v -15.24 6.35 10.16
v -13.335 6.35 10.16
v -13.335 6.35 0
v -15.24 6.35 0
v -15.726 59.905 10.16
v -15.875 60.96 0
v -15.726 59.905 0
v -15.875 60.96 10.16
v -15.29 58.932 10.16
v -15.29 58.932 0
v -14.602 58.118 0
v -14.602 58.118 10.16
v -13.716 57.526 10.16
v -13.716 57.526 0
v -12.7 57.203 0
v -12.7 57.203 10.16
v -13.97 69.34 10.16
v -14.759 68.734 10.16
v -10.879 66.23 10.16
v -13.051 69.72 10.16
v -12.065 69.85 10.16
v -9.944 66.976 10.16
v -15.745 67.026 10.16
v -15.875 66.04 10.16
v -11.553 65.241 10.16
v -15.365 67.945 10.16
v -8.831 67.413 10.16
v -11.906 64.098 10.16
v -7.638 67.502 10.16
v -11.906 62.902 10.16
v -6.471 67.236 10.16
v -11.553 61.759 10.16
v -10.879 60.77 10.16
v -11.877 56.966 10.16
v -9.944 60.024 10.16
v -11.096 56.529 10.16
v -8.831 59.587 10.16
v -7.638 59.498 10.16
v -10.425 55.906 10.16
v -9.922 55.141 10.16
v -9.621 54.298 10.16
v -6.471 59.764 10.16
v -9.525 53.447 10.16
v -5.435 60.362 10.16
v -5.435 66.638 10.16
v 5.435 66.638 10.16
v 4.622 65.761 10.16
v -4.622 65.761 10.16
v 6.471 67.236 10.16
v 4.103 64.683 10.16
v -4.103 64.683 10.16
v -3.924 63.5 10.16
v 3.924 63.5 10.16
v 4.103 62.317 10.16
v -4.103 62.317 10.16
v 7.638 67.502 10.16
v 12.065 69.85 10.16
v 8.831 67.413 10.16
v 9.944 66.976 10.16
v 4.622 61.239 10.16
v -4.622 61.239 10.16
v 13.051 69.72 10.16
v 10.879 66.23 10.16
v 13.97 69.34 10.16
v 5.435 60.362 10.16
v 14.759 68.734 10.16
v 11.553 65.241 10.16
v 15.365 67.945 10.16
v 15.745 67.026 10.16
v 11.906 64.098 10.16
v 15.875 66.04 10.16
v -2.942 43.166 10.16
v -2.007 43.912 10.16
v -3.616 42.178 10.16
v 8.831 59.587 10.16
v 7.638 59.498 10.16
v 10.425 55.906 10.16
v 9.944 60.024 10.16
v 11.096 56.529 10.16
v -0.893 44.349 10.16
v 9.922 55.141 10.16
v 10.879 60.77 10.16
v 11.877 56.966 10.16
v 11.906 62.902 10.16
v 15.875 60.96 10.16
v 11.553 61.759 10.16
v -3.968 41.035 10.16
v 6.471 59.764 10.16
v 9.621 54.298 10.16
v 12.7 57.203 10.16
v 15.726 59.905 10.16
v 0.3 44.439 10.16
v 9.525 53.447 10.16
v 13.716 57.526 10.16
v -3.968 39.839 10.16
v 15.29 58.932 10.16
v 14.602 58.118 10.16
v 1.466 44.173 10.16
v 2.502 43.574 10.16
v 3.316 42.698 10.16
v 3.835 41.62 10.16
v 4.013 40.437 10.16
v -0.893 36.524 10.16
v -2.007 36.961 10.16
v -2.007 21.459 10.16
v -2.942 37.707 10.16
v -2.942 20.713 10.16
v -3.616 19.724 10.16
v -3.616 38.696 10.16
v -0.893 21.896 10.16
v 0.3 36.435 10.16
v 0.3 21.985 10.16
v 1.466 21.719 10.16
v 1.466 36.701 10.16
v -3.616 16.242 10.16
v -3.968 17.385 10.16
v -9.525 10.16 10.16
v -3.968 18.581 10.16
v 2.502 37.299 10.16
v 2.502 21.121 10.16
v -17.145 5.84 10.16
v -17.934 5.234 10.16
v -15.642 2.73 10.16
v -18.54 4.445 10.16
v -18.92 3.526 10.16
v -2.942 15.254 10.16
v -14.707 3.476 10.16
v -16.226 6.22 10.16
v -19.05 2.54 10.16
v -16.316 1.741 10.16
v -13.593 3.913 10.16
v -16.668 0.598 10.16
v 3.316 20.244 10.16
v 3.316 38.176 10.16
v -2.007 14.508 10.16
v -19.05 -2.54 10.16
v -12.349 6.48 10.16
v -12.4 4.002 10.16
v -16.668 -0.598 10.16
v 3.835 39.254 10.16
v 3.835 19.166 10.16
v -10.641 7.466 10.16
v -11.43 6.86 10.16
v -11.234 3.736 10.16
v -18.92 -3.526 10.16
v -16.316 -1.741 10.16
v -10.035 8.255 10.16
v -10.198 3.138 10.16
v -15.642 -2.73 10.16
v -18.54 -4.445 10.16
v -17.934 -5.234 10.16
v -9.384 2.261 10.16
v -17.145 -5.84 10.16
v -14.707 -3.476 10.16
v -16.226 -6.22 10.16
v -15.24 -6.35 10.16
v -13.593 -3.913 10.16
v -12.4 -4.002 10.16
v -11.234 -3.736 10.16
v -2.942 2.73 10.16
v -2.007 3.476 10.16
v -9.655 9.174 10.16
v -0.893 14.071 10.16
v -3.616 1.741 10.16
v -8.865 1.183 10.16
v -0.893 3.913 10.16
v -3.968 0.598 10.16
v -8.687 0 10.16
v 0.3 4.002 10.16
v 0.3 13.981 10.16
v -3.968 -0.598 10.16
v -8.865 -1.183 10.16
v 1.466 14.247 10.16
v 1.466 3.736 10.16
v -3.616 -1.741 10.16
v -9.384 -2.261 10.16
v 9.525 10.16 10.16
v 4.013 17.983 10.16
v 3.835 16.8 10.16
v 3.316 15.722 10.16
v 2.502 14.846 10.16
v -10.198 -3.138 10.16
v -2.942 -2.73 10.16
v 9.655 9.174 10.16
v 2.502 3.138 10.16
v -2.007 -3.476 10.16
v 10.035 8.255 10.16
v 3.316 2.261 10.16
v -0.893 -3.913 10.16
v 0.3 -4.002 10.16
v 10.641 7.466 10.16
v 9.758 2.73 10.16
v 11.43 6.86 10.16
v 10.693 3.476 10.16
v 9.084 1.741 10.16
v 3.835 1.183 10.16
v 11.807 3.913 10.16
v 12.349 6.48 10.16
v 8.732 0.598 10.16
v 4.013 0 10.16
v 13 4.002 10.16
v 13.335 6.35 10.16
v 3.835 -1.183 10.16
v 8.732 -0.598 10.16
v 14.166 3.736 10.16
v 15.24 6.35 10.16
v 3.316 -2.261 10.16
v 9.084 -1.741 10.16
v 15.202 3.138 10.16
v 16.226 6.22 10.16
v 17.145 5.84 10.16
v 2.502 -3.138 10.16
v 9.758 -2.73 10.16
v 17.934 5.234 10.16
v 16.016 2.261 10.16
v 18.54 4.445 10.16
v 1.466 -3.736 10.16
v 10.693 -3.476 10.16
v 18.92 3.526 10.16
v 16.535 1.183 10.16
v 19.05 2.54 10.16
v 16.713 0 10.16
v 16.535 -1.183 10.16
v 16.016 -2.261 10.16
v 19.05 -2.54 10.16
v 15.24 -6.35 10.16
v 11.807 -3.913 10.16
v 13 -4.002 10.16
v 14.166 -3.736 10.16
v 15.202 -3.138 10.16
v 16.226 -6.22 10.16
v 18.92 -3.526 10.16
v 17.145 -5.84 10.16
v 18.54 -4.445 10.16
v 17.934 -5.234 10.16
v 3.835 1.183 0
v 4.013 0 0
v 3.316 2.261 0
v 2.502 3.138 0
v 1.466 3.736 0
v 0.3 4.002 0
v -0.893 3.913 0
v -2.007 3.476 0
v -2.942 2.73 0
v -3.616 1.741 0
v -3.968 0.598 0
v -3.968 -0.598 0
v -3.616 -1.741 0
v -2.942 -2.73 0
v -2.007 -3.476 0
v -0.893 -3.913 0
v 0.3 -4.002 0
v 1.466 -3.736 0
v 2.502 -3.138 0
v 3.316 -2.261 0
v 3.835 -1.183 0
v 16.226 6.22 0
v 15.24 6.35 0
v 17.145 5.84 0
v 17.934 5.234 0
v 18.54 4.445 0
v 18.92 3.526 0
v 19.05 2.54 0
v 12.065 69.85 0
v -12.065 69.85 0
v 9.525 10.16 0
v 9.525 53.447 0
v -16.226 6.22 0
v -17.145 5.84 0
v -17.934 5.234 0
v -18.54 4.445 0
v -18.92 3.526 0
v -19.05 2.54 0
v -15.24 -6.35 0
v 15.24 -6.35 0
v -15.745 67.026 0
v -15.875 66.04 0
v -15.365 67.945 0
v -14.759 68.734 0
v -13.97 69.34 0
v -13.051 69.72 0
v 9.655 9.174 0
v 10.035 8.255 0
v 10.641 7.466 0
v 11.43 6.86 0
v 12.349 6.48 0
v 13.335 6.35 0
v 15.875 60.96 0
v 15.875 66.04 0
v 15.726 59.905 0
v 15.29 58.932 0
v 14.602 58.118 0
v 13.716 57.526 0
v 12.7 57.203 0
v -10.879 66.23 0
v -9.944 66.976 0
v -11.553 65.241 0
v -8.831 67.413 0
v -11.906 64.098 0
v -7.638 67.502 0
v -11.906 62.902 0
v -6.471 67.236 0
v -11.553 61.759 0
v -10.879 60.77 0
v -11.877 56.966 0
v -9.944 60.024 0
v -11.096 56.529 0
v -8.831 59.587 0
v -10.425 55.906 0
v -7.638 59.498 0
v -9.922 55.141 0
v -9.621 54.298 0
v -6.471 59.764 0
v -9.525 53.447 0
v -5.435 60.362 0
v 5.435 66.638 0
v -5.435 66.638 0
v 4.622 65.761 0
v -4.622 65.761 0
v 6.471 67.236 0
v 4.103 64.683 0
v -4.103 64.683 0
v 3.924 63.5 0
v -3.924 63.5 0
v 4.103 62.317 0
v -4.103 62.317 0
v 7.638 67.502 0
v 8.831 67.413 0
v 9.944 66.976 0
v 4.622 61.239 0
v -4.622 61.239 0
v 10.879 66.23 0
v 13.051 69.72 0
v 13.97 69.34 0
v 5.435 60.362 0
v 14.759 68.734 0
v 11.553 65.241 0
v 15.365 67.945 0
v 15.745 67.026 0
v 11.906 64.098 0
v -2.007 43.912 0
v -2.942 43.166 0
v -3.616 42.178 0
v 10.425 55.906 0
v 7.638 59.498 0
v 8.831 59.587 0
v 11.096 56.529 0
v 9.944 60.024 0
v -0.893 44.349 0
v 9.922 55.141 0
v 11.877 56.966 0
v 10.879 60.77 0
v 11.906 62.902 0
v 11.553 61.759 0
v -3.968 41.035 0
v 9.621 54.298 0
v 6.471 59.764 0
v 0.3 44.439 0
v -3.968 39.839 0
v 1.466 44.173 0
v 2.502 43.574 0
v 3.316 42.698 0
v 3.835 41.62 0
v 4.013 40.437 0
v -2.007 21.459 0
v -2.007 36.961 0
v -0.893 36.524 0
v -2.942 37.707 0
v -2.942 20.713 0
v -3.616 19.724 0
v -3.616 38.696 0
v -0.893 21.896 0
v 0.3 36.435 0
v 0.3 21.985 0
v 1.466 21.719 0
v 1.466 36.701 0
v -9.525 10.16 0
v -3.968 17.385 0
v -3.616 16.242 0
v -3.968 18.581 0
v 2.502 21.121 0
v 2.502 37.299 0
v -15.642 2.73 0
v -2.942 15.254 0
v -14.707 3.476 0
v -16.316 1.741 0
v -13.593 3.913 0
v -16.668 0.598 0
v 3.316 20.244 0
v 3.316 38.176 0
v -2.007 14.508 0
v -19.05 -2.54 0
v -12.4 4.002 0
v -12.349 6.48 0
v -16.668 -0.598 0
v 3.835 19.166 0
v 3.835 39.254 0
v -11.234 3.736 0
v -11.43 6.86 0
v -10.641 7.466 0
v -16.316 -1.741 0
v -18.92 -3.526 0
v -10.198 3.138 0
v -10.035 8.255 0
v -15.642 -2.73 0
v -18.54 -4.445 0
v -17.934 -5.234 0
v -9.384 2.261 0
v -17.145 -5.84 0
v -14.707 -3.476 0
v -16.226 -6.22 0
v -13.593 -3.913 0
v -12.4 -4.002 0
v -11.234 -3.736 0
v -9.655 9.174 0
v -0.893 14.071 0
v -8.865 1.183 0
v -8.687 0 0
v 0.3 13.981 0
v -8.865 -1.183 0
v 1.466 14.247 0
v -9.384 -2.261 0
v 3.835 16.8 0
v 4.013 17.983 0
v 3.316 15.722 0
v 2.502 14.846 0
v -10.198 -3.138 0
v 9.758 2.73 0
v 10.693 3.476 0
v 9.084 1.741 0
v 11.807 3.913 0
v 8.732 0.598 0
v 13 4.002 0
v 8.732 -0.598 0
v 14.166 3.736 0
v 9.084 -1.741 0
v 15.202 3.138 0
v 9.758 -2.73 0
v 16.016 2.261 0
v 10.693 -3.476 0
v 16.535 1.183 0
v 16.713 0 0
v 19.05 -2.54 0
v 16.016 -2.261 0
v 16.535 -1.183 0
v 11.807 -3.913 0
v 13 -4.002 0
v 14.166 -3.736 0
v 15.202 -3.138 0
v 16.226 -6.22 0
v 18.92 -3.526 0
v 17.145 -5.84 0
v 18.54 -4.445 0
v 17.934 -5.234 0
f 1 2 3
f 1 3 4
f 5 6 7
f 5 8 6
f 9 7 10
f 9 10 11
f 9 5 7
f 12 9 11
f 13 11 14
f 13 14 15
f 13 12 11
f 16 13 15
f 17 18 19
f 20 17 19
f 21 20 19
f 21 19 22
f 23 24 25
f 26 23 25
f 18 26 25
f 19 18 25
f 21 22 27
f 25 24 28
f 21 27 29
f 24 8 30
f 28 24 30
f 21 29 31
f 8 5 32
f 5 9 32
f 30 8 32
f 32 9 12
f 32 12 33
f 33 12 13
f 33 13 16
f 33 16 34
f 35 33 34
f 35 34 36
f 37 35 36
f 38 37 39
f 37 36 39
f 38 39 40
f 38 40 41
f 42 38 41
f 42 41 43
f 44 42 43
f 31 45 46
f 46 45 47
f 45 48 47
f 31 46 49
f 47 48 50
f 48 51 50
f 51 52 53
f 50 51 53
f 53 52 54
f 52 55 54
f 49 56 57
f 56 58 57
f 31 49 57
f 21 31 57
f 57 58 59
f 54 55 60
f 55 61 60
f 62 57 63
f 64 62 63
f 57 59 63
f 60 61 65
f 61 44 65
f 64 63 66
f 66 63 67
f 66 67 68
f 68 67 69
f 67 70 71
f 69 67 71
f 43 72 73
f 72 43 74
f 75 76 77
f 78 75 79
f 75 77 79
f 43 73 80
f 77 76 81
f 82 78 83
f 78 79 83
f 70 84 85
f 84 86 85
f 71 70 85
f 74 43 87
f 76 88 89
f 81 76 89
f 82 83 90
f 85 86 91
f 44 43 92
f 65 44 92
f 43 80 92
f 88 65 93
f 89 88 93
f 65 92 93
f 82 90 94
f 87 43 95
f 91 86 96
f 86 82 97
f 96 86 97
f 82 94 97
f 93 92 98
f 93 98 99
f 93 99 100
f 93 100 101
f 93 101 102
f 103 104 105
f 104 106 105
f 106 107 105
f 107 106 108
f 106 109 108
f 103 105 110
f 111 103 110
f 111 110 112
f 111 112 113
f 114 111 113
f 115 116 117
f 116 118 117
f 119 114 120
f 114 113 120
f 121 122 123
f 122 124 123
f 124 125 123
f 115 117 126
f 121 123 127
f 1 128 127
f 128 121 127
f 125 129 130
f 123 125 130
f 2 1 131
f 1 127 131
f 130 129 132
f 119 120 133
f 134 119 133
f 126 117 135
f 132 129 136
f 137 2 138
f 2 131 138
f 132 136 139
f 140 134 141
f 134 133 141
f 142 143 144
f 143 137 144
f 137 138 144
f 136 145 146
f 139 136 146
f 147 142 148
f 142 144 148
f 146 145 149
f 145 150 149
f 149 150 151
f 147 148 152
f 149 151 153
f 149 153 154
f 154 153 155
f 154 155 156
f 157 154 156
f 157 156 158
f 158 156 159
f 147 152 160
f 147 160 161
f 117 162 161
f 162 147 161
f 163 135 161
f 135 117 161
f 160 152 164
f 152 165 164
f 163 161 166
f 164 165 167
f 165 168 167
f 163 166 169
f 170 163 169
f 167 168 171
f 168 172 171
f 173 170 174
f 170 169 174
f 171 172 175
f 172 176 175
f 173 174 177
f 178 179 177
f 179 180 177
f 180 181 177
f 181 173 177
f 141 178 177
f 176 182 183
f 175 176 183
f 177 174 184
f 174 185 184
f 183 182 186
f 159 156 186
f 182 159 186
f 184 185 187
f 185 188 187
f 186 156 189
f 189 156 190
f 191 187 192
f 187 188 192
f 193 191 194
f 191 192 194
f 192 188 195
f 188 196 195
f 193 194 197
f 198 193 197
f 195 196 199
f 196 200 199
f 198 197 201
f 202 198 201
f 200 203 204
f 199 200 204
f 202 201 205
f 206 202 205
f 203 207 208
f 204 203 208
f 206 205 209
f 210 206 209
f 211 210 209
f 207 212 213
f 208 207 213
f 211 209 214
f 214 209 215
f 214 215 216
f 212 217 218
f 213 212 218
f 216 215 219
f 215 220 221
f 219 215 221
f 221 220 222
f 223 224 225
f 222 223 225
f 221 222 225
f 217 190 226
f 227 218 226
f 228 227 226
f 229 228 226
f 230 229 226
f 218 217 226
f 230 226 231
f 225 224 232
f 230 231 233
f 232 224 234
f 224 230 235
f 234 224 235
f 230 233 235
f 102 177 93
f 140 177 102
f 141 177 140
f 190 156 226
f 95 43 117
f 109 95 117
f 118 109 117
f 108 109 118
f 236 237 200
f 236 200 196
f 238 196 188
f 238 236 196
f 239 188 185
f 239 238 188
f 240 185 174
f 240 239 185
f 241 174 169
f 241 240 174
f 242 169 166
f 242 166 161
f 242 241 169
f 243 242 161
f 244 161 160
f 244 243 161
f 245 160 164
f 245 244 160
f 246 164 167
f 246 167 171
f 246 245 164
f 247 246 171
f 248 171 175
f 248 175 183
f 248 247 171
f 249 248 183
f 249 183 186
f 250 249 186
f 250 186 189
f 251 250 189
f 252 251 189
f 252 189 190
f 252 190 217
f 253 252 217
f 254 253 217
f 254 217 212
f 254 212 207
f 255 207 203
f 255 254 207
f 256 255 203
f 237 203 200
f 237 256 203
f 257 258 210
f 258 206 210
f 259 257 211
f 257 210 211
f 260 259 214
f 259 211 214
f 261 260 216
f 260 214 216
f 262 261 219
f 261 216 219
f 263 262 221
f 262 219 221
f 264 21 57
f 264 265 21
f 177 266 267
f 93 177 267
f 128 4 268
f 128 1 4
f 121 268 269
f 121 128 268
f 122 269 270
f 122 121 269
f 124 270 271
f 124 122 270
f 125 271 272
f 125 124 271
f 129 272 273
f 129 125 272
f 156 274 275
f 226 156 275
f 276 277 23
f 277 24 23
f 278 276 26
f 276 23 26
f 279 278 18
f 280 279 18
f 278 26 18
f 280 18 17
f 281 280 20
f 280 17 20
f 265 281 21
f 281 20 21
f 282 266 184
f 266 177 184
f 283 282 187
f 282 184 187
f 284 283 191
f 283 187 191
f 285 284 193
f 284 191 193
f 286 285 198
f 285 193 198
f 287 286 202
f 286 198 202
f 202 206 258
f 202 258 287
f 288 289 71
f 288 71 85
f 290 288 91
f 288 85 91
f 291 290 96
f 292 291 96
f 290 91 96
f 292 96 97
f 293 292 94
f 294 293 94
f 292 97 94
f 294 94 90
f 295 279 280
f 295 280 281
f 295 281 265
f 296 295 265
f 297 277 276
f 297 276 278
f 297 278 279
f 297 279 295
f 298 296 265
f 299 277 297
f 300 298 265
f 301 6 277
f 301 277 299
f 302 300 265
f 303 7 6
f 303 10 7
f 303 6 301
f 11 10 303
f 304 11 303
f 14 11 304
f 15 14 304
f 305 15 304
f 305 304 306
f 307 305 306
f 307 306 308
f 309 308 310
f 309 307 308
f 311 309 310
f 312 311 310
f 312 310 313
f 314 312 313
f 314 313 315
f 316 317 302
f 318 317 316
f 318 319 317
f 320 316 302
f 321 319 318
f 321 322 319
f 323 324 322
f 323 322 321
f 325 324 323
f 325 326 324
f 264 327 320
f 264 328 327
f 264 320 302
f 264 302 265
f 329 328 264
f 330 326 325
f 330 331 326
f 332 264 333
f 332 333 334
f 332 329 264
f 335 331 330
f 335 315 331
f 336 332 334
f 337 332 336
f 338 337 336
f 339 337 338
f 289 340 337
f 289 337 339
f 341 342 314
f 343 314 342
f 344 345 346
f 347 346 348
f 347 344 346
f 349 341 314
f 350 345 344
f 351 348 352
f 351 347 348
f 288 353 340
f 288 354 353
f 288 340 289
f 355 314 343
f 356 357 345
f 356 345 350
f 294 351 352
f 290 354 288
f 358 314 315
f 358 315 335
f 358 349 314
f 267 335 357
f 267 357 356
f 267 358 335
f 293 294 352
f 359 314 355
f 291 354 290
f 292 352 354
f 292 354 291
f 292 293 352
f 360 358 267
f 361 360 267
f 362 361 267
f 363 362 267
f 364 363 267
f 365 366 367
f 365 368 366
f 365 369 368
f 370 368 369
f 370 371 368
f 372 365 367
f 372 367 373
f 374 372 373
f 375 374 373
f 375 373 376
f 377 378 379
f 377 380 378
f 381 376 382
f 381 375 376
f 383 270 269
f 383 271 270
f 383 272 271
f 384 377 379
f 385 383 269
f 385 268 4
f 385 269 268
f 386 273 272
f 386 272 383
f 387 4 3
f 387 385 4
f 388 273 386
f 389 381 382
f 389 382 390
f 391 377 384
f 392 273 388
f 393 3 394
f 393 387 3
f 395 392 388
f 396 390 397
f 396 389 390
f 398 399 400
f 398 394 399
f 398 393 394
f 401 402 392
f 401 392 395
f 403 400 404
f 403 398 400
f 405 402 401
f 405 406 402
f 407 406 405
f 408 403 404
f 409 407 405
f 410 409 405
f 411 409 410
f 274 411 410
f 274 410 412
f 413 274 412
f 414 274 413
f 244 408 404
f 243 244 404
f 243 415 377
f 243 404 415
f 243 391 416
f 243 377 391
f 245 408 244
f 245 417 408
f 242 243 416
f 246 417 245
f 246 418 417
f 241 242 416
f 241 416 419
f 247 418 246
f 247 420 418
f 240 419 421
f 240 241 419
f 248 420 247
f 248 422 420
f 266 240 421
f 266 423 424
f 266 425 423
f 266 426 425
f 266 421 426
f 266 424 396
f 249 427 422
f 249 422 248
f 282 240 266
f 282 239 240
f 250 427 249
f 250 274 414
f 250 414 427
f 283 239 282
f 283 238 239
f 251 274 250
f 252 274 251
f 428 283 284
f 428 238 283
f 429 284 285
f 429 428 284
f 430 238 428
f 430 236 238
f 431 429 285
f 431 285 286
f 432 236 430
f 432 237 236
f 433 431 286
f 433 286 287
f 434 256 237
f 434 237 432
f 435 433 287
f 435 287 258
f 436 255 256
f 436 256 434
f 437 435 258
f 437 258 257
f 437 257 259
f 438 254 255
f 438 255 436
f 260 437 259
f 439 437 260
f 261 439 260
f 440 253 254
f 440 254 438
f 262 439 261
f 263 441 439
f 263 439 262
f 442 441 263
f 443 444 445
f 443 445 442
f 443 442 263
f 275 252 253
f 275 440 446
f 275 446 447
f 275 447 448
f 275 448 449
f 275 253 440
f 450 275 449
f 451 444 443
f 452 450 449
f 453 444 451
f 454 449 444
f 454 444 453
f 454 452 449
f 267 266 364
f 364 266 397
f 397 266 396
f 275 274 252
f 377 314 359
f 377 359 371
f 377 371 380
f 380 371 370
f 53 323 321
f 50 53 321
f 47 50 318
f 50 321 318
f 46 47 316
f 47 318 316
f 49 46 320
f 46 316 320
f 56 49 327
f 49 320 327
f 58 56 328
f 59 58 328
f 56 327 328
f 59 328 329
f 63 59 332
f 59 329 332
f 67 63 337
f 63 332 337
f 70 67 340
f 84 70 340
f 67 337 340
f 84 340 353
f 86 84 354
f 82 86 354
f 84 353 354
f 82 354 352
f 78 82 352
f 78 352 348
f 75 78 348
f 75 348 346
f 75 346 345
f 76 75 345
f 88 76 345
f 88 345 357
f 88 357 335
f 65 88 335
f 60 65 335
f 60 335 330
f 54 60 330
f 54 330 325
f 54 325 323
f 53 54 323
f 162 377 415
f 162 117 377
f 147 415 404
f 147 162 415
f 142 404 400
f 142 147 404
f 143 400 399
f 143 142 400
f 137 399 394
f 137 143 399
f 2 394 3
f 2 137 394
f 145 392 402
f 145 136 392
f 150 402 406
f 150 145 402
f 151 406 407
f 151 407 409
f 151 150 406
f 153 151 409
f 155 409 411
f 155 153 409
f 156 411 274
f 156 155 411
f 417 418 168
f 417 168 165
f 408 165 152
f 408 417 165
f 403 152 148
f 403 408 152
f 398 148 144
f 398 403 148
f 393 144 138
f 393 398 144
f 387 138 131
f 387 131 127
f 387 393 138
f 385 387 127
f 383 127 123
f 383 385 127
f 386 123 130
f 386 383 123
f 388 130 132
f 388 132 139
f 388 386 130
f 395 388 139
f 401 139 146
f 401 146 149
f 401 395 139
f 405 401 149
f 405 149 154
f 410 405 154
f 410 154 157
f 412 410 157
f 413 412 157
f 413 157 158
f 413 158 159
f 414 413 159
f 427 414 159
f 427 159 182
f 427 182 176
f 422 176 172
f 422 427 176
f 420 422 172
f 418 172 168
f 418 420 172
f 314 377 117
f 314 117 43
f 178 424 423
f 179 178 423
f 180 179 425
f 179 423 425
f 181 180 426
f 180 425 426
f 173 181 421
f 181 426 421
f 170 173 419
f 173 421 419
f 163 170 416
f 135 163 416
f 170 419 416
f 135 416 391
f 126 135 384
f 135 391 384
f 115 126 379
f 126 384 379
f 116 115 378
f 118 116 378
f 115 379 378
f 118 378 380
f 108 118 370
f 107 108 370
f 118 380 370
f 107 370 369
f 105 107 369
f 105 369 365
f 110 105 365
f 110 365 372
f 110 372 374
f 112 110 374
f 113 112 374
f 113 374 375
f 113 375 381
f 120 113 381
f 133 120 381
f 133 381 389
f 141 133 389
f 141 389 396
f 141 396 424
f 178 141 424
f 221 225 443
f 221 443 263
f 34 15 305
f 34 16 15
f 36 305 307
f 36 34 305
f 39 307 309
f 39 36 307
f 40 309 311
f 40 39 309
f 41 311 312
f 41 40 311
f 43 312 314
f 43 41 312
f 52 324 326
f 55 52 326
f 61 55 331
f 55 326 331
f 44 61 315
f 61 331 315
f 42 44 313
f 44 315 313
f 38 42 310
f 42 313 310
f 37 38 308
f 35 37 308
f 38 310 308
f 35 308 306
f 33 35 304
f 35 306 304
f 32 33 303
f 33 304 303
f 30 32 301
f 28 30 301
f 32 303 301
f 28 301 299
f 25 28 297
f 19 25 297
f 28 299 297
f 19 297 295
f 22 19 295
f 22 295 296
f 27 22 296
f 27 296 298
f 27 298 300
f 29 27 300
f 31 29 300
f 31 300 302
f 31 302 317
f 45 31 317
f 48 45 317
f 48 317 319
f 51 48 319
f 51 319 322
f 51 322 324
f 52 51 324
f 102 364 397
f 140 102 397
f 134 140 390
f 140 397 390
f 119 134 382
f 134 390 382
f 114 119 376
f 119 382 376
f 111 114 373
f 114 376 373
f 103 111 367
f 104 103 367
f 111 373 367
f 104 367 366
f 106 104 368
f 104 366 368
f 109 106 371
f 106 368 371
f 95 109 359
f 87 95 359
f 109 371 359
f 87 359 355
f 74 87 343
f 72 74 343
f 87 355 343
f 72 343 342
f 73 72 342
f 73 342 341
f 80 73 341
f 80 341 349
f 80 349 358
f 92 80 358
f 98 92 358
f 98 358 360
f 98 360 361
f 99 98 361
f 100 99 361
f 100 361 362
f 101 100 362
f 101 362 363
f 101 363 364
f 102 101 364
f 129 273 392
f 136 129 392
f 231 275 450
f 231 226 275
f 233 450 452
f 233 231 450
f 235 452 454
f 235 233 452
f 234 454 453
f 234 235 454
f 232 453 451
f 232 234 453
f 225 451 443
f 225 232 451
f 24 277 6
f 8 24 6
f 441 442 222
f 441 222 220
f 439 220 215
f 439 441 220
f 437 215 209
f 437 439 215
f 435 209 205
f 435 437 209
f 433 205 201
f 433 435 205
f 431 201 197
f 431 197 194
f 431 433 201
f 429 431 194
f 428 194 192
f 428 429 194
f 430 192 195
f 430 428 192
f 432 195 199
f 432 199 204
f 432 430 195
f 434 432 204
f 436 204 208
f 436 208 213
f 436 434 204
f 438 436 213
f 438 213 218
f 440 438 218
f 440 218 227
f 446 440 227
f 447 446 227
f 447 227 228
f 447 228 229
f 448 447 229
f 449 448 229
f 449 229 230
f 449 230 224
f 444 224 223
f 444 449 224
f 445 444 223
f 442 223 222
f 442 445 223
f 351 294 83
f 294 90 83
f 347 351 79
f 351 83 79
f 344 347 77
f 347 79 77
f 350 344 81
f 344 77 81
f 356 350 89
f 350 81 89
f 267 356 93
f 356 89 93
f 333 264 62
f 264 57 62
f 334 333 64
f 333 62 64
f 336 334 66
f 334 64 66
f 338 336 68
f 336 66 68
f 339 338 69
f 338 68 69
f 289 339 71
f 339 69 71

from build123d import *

# Parameters (mm, degrees)
F0_W      = 19.05
F0_H      = 63.5
F0_R      = 4.0132
F1_DEPTH  = 10.16
F2_R      = 4.0132
F3_DEPTH  = 25.4
F4_W      = 6.35
F4_H      = 12.7
F5_DEPTH  = 10.16
F7_DEPTH  = 25.4
F8_R      = 3.81
F9_R      = 3.81
F10_R     = 4.0132
F11_DEPTH = 25.4


with BuildPart() as f1:
    # F0 (on Top) → F1 (new body)
    with BuildSketch(Plane.XY):
        with Locations((0, 38.1)):
            Rectangle(F0_W, F0_H)
        Polygon((-19.05, -6.35), (19.05, -6.35), (19.05, 6.35), (9.525, 6.35), (-9.525, 6.35), (-19.05, 6.35), align=None)
        with Locations((-12.7, 0)):
            Circle(F0_R, mode=Mode.SUBTRACT)
        Circle(F0_R, mode=Mode.SUBTRACT)
        with Locations((12.7, 0)):
            Circle(F0_R, mode=Mode.SUBTRACT)
    extrude(amount=F1_DEPTH)

    # F2 (on face) → F3 (cut)
    with BuildSketch(Plane(origin=(0, 0, 0), x_dir=(1, 0, 0), z_dir=(0, 0, -1))):
        with Locations((0, -17.9832)):
            Circle(F2_R)
    extrude(amount=-F3_DEPTH, mode=Mode.SUBTRACT)

    # F4 (on face) → F5 (join)
    with BuildSketch(Plane(origin=(0, 0, 0), x_dir=(1, 0, 0), z_dir=(0, 0, -1))):
        with Locations((-12.7, -63.5)):
            Rectangle(F4_W, F4_H)
        with Locations((12.7, -63.5)):
            Rectangle(F4_W, F4_H)
    extrude(amount=-F5_DEPTH)

    # F6 (on face) → F7 (cut)
    with BuildSketch(Plane(origin=(0, 0, 0), x_dir=(1, 0, 0), z_dir=(0, 0, -1))):
        with BuildLine():
            ThreePointArc((-11.9507, -63.5), (-7.9375, -67.5132), (-3.9243, -63.5))
            Line((-3.9243, -63.5), (-11.9507, -63.5))
        make_face()
        with BuildLine():
            Line((-11.9507, -63.5), (-3.9243, -63.5))
            ThreePointArc((-3.9243, -63.5), (-7.9375, -59.4868), (-11.9507, -63.5))
        make_face()
        with BuildLine():
            Line((3.9243, -63.5), (11.9507, -63.5))
            ThreePointArc((11.9507, -63.5), (7.9375, -59.4868), (3.9243, -63.5))
        make_face()
        with BuildLine():
            ThreePointArc((3.9243, -63.5), (7.9375, -67.5132), (11.9507, -63.5))
            Line((11.9507, -63.5), (3.9243, -63.5))
        make_face()
    extrude(amount=-F7_DEPTH, mode=Mode.SUBTRACT)

    # F8
    f8_edges = [f1.edges().sort_by_distance(p)[0] for p in [
        (19.05, -6.35, 5.08),
        (-19.05, -6.35, 5.08),
        (-19.05, 6.35, 5.08),
        (19.05, 6.35, 5.08),
        (15.875, 57.15, 5.08),
        (15.875, 69.85, 5.08),
        (-15.875, 69.85, 5.08),
        (-15.875, 57.15, 5.08),
    ]]
    fillet(f8_edges, radius=F8_R)

    # F9
    f9_edges = [f1.edges().sort_by_distance(p)[0] for p in [
        (-9.525, 6.35, 5.08),
        (-9.525, 57.15, 5.08),
        (9.525, 6.35, 5.08),
        (9.525, 57.15, 5.08),
    ]]
    fillet(f9_edges, radius=F9_R)

    # F10 (on face) → F11 (cut)
    with BuildSketch(Plane(origin=(0, 0, 0), x_dir=(1, 0, 0), z_dir=(0, 0, -1))):
        with Locations((0, -40.4368)):
            Circle(F10_R)
    extrude(amount=-F11_DEPTH, mode=Mode.SUBTRACT)


solid = f1.part
